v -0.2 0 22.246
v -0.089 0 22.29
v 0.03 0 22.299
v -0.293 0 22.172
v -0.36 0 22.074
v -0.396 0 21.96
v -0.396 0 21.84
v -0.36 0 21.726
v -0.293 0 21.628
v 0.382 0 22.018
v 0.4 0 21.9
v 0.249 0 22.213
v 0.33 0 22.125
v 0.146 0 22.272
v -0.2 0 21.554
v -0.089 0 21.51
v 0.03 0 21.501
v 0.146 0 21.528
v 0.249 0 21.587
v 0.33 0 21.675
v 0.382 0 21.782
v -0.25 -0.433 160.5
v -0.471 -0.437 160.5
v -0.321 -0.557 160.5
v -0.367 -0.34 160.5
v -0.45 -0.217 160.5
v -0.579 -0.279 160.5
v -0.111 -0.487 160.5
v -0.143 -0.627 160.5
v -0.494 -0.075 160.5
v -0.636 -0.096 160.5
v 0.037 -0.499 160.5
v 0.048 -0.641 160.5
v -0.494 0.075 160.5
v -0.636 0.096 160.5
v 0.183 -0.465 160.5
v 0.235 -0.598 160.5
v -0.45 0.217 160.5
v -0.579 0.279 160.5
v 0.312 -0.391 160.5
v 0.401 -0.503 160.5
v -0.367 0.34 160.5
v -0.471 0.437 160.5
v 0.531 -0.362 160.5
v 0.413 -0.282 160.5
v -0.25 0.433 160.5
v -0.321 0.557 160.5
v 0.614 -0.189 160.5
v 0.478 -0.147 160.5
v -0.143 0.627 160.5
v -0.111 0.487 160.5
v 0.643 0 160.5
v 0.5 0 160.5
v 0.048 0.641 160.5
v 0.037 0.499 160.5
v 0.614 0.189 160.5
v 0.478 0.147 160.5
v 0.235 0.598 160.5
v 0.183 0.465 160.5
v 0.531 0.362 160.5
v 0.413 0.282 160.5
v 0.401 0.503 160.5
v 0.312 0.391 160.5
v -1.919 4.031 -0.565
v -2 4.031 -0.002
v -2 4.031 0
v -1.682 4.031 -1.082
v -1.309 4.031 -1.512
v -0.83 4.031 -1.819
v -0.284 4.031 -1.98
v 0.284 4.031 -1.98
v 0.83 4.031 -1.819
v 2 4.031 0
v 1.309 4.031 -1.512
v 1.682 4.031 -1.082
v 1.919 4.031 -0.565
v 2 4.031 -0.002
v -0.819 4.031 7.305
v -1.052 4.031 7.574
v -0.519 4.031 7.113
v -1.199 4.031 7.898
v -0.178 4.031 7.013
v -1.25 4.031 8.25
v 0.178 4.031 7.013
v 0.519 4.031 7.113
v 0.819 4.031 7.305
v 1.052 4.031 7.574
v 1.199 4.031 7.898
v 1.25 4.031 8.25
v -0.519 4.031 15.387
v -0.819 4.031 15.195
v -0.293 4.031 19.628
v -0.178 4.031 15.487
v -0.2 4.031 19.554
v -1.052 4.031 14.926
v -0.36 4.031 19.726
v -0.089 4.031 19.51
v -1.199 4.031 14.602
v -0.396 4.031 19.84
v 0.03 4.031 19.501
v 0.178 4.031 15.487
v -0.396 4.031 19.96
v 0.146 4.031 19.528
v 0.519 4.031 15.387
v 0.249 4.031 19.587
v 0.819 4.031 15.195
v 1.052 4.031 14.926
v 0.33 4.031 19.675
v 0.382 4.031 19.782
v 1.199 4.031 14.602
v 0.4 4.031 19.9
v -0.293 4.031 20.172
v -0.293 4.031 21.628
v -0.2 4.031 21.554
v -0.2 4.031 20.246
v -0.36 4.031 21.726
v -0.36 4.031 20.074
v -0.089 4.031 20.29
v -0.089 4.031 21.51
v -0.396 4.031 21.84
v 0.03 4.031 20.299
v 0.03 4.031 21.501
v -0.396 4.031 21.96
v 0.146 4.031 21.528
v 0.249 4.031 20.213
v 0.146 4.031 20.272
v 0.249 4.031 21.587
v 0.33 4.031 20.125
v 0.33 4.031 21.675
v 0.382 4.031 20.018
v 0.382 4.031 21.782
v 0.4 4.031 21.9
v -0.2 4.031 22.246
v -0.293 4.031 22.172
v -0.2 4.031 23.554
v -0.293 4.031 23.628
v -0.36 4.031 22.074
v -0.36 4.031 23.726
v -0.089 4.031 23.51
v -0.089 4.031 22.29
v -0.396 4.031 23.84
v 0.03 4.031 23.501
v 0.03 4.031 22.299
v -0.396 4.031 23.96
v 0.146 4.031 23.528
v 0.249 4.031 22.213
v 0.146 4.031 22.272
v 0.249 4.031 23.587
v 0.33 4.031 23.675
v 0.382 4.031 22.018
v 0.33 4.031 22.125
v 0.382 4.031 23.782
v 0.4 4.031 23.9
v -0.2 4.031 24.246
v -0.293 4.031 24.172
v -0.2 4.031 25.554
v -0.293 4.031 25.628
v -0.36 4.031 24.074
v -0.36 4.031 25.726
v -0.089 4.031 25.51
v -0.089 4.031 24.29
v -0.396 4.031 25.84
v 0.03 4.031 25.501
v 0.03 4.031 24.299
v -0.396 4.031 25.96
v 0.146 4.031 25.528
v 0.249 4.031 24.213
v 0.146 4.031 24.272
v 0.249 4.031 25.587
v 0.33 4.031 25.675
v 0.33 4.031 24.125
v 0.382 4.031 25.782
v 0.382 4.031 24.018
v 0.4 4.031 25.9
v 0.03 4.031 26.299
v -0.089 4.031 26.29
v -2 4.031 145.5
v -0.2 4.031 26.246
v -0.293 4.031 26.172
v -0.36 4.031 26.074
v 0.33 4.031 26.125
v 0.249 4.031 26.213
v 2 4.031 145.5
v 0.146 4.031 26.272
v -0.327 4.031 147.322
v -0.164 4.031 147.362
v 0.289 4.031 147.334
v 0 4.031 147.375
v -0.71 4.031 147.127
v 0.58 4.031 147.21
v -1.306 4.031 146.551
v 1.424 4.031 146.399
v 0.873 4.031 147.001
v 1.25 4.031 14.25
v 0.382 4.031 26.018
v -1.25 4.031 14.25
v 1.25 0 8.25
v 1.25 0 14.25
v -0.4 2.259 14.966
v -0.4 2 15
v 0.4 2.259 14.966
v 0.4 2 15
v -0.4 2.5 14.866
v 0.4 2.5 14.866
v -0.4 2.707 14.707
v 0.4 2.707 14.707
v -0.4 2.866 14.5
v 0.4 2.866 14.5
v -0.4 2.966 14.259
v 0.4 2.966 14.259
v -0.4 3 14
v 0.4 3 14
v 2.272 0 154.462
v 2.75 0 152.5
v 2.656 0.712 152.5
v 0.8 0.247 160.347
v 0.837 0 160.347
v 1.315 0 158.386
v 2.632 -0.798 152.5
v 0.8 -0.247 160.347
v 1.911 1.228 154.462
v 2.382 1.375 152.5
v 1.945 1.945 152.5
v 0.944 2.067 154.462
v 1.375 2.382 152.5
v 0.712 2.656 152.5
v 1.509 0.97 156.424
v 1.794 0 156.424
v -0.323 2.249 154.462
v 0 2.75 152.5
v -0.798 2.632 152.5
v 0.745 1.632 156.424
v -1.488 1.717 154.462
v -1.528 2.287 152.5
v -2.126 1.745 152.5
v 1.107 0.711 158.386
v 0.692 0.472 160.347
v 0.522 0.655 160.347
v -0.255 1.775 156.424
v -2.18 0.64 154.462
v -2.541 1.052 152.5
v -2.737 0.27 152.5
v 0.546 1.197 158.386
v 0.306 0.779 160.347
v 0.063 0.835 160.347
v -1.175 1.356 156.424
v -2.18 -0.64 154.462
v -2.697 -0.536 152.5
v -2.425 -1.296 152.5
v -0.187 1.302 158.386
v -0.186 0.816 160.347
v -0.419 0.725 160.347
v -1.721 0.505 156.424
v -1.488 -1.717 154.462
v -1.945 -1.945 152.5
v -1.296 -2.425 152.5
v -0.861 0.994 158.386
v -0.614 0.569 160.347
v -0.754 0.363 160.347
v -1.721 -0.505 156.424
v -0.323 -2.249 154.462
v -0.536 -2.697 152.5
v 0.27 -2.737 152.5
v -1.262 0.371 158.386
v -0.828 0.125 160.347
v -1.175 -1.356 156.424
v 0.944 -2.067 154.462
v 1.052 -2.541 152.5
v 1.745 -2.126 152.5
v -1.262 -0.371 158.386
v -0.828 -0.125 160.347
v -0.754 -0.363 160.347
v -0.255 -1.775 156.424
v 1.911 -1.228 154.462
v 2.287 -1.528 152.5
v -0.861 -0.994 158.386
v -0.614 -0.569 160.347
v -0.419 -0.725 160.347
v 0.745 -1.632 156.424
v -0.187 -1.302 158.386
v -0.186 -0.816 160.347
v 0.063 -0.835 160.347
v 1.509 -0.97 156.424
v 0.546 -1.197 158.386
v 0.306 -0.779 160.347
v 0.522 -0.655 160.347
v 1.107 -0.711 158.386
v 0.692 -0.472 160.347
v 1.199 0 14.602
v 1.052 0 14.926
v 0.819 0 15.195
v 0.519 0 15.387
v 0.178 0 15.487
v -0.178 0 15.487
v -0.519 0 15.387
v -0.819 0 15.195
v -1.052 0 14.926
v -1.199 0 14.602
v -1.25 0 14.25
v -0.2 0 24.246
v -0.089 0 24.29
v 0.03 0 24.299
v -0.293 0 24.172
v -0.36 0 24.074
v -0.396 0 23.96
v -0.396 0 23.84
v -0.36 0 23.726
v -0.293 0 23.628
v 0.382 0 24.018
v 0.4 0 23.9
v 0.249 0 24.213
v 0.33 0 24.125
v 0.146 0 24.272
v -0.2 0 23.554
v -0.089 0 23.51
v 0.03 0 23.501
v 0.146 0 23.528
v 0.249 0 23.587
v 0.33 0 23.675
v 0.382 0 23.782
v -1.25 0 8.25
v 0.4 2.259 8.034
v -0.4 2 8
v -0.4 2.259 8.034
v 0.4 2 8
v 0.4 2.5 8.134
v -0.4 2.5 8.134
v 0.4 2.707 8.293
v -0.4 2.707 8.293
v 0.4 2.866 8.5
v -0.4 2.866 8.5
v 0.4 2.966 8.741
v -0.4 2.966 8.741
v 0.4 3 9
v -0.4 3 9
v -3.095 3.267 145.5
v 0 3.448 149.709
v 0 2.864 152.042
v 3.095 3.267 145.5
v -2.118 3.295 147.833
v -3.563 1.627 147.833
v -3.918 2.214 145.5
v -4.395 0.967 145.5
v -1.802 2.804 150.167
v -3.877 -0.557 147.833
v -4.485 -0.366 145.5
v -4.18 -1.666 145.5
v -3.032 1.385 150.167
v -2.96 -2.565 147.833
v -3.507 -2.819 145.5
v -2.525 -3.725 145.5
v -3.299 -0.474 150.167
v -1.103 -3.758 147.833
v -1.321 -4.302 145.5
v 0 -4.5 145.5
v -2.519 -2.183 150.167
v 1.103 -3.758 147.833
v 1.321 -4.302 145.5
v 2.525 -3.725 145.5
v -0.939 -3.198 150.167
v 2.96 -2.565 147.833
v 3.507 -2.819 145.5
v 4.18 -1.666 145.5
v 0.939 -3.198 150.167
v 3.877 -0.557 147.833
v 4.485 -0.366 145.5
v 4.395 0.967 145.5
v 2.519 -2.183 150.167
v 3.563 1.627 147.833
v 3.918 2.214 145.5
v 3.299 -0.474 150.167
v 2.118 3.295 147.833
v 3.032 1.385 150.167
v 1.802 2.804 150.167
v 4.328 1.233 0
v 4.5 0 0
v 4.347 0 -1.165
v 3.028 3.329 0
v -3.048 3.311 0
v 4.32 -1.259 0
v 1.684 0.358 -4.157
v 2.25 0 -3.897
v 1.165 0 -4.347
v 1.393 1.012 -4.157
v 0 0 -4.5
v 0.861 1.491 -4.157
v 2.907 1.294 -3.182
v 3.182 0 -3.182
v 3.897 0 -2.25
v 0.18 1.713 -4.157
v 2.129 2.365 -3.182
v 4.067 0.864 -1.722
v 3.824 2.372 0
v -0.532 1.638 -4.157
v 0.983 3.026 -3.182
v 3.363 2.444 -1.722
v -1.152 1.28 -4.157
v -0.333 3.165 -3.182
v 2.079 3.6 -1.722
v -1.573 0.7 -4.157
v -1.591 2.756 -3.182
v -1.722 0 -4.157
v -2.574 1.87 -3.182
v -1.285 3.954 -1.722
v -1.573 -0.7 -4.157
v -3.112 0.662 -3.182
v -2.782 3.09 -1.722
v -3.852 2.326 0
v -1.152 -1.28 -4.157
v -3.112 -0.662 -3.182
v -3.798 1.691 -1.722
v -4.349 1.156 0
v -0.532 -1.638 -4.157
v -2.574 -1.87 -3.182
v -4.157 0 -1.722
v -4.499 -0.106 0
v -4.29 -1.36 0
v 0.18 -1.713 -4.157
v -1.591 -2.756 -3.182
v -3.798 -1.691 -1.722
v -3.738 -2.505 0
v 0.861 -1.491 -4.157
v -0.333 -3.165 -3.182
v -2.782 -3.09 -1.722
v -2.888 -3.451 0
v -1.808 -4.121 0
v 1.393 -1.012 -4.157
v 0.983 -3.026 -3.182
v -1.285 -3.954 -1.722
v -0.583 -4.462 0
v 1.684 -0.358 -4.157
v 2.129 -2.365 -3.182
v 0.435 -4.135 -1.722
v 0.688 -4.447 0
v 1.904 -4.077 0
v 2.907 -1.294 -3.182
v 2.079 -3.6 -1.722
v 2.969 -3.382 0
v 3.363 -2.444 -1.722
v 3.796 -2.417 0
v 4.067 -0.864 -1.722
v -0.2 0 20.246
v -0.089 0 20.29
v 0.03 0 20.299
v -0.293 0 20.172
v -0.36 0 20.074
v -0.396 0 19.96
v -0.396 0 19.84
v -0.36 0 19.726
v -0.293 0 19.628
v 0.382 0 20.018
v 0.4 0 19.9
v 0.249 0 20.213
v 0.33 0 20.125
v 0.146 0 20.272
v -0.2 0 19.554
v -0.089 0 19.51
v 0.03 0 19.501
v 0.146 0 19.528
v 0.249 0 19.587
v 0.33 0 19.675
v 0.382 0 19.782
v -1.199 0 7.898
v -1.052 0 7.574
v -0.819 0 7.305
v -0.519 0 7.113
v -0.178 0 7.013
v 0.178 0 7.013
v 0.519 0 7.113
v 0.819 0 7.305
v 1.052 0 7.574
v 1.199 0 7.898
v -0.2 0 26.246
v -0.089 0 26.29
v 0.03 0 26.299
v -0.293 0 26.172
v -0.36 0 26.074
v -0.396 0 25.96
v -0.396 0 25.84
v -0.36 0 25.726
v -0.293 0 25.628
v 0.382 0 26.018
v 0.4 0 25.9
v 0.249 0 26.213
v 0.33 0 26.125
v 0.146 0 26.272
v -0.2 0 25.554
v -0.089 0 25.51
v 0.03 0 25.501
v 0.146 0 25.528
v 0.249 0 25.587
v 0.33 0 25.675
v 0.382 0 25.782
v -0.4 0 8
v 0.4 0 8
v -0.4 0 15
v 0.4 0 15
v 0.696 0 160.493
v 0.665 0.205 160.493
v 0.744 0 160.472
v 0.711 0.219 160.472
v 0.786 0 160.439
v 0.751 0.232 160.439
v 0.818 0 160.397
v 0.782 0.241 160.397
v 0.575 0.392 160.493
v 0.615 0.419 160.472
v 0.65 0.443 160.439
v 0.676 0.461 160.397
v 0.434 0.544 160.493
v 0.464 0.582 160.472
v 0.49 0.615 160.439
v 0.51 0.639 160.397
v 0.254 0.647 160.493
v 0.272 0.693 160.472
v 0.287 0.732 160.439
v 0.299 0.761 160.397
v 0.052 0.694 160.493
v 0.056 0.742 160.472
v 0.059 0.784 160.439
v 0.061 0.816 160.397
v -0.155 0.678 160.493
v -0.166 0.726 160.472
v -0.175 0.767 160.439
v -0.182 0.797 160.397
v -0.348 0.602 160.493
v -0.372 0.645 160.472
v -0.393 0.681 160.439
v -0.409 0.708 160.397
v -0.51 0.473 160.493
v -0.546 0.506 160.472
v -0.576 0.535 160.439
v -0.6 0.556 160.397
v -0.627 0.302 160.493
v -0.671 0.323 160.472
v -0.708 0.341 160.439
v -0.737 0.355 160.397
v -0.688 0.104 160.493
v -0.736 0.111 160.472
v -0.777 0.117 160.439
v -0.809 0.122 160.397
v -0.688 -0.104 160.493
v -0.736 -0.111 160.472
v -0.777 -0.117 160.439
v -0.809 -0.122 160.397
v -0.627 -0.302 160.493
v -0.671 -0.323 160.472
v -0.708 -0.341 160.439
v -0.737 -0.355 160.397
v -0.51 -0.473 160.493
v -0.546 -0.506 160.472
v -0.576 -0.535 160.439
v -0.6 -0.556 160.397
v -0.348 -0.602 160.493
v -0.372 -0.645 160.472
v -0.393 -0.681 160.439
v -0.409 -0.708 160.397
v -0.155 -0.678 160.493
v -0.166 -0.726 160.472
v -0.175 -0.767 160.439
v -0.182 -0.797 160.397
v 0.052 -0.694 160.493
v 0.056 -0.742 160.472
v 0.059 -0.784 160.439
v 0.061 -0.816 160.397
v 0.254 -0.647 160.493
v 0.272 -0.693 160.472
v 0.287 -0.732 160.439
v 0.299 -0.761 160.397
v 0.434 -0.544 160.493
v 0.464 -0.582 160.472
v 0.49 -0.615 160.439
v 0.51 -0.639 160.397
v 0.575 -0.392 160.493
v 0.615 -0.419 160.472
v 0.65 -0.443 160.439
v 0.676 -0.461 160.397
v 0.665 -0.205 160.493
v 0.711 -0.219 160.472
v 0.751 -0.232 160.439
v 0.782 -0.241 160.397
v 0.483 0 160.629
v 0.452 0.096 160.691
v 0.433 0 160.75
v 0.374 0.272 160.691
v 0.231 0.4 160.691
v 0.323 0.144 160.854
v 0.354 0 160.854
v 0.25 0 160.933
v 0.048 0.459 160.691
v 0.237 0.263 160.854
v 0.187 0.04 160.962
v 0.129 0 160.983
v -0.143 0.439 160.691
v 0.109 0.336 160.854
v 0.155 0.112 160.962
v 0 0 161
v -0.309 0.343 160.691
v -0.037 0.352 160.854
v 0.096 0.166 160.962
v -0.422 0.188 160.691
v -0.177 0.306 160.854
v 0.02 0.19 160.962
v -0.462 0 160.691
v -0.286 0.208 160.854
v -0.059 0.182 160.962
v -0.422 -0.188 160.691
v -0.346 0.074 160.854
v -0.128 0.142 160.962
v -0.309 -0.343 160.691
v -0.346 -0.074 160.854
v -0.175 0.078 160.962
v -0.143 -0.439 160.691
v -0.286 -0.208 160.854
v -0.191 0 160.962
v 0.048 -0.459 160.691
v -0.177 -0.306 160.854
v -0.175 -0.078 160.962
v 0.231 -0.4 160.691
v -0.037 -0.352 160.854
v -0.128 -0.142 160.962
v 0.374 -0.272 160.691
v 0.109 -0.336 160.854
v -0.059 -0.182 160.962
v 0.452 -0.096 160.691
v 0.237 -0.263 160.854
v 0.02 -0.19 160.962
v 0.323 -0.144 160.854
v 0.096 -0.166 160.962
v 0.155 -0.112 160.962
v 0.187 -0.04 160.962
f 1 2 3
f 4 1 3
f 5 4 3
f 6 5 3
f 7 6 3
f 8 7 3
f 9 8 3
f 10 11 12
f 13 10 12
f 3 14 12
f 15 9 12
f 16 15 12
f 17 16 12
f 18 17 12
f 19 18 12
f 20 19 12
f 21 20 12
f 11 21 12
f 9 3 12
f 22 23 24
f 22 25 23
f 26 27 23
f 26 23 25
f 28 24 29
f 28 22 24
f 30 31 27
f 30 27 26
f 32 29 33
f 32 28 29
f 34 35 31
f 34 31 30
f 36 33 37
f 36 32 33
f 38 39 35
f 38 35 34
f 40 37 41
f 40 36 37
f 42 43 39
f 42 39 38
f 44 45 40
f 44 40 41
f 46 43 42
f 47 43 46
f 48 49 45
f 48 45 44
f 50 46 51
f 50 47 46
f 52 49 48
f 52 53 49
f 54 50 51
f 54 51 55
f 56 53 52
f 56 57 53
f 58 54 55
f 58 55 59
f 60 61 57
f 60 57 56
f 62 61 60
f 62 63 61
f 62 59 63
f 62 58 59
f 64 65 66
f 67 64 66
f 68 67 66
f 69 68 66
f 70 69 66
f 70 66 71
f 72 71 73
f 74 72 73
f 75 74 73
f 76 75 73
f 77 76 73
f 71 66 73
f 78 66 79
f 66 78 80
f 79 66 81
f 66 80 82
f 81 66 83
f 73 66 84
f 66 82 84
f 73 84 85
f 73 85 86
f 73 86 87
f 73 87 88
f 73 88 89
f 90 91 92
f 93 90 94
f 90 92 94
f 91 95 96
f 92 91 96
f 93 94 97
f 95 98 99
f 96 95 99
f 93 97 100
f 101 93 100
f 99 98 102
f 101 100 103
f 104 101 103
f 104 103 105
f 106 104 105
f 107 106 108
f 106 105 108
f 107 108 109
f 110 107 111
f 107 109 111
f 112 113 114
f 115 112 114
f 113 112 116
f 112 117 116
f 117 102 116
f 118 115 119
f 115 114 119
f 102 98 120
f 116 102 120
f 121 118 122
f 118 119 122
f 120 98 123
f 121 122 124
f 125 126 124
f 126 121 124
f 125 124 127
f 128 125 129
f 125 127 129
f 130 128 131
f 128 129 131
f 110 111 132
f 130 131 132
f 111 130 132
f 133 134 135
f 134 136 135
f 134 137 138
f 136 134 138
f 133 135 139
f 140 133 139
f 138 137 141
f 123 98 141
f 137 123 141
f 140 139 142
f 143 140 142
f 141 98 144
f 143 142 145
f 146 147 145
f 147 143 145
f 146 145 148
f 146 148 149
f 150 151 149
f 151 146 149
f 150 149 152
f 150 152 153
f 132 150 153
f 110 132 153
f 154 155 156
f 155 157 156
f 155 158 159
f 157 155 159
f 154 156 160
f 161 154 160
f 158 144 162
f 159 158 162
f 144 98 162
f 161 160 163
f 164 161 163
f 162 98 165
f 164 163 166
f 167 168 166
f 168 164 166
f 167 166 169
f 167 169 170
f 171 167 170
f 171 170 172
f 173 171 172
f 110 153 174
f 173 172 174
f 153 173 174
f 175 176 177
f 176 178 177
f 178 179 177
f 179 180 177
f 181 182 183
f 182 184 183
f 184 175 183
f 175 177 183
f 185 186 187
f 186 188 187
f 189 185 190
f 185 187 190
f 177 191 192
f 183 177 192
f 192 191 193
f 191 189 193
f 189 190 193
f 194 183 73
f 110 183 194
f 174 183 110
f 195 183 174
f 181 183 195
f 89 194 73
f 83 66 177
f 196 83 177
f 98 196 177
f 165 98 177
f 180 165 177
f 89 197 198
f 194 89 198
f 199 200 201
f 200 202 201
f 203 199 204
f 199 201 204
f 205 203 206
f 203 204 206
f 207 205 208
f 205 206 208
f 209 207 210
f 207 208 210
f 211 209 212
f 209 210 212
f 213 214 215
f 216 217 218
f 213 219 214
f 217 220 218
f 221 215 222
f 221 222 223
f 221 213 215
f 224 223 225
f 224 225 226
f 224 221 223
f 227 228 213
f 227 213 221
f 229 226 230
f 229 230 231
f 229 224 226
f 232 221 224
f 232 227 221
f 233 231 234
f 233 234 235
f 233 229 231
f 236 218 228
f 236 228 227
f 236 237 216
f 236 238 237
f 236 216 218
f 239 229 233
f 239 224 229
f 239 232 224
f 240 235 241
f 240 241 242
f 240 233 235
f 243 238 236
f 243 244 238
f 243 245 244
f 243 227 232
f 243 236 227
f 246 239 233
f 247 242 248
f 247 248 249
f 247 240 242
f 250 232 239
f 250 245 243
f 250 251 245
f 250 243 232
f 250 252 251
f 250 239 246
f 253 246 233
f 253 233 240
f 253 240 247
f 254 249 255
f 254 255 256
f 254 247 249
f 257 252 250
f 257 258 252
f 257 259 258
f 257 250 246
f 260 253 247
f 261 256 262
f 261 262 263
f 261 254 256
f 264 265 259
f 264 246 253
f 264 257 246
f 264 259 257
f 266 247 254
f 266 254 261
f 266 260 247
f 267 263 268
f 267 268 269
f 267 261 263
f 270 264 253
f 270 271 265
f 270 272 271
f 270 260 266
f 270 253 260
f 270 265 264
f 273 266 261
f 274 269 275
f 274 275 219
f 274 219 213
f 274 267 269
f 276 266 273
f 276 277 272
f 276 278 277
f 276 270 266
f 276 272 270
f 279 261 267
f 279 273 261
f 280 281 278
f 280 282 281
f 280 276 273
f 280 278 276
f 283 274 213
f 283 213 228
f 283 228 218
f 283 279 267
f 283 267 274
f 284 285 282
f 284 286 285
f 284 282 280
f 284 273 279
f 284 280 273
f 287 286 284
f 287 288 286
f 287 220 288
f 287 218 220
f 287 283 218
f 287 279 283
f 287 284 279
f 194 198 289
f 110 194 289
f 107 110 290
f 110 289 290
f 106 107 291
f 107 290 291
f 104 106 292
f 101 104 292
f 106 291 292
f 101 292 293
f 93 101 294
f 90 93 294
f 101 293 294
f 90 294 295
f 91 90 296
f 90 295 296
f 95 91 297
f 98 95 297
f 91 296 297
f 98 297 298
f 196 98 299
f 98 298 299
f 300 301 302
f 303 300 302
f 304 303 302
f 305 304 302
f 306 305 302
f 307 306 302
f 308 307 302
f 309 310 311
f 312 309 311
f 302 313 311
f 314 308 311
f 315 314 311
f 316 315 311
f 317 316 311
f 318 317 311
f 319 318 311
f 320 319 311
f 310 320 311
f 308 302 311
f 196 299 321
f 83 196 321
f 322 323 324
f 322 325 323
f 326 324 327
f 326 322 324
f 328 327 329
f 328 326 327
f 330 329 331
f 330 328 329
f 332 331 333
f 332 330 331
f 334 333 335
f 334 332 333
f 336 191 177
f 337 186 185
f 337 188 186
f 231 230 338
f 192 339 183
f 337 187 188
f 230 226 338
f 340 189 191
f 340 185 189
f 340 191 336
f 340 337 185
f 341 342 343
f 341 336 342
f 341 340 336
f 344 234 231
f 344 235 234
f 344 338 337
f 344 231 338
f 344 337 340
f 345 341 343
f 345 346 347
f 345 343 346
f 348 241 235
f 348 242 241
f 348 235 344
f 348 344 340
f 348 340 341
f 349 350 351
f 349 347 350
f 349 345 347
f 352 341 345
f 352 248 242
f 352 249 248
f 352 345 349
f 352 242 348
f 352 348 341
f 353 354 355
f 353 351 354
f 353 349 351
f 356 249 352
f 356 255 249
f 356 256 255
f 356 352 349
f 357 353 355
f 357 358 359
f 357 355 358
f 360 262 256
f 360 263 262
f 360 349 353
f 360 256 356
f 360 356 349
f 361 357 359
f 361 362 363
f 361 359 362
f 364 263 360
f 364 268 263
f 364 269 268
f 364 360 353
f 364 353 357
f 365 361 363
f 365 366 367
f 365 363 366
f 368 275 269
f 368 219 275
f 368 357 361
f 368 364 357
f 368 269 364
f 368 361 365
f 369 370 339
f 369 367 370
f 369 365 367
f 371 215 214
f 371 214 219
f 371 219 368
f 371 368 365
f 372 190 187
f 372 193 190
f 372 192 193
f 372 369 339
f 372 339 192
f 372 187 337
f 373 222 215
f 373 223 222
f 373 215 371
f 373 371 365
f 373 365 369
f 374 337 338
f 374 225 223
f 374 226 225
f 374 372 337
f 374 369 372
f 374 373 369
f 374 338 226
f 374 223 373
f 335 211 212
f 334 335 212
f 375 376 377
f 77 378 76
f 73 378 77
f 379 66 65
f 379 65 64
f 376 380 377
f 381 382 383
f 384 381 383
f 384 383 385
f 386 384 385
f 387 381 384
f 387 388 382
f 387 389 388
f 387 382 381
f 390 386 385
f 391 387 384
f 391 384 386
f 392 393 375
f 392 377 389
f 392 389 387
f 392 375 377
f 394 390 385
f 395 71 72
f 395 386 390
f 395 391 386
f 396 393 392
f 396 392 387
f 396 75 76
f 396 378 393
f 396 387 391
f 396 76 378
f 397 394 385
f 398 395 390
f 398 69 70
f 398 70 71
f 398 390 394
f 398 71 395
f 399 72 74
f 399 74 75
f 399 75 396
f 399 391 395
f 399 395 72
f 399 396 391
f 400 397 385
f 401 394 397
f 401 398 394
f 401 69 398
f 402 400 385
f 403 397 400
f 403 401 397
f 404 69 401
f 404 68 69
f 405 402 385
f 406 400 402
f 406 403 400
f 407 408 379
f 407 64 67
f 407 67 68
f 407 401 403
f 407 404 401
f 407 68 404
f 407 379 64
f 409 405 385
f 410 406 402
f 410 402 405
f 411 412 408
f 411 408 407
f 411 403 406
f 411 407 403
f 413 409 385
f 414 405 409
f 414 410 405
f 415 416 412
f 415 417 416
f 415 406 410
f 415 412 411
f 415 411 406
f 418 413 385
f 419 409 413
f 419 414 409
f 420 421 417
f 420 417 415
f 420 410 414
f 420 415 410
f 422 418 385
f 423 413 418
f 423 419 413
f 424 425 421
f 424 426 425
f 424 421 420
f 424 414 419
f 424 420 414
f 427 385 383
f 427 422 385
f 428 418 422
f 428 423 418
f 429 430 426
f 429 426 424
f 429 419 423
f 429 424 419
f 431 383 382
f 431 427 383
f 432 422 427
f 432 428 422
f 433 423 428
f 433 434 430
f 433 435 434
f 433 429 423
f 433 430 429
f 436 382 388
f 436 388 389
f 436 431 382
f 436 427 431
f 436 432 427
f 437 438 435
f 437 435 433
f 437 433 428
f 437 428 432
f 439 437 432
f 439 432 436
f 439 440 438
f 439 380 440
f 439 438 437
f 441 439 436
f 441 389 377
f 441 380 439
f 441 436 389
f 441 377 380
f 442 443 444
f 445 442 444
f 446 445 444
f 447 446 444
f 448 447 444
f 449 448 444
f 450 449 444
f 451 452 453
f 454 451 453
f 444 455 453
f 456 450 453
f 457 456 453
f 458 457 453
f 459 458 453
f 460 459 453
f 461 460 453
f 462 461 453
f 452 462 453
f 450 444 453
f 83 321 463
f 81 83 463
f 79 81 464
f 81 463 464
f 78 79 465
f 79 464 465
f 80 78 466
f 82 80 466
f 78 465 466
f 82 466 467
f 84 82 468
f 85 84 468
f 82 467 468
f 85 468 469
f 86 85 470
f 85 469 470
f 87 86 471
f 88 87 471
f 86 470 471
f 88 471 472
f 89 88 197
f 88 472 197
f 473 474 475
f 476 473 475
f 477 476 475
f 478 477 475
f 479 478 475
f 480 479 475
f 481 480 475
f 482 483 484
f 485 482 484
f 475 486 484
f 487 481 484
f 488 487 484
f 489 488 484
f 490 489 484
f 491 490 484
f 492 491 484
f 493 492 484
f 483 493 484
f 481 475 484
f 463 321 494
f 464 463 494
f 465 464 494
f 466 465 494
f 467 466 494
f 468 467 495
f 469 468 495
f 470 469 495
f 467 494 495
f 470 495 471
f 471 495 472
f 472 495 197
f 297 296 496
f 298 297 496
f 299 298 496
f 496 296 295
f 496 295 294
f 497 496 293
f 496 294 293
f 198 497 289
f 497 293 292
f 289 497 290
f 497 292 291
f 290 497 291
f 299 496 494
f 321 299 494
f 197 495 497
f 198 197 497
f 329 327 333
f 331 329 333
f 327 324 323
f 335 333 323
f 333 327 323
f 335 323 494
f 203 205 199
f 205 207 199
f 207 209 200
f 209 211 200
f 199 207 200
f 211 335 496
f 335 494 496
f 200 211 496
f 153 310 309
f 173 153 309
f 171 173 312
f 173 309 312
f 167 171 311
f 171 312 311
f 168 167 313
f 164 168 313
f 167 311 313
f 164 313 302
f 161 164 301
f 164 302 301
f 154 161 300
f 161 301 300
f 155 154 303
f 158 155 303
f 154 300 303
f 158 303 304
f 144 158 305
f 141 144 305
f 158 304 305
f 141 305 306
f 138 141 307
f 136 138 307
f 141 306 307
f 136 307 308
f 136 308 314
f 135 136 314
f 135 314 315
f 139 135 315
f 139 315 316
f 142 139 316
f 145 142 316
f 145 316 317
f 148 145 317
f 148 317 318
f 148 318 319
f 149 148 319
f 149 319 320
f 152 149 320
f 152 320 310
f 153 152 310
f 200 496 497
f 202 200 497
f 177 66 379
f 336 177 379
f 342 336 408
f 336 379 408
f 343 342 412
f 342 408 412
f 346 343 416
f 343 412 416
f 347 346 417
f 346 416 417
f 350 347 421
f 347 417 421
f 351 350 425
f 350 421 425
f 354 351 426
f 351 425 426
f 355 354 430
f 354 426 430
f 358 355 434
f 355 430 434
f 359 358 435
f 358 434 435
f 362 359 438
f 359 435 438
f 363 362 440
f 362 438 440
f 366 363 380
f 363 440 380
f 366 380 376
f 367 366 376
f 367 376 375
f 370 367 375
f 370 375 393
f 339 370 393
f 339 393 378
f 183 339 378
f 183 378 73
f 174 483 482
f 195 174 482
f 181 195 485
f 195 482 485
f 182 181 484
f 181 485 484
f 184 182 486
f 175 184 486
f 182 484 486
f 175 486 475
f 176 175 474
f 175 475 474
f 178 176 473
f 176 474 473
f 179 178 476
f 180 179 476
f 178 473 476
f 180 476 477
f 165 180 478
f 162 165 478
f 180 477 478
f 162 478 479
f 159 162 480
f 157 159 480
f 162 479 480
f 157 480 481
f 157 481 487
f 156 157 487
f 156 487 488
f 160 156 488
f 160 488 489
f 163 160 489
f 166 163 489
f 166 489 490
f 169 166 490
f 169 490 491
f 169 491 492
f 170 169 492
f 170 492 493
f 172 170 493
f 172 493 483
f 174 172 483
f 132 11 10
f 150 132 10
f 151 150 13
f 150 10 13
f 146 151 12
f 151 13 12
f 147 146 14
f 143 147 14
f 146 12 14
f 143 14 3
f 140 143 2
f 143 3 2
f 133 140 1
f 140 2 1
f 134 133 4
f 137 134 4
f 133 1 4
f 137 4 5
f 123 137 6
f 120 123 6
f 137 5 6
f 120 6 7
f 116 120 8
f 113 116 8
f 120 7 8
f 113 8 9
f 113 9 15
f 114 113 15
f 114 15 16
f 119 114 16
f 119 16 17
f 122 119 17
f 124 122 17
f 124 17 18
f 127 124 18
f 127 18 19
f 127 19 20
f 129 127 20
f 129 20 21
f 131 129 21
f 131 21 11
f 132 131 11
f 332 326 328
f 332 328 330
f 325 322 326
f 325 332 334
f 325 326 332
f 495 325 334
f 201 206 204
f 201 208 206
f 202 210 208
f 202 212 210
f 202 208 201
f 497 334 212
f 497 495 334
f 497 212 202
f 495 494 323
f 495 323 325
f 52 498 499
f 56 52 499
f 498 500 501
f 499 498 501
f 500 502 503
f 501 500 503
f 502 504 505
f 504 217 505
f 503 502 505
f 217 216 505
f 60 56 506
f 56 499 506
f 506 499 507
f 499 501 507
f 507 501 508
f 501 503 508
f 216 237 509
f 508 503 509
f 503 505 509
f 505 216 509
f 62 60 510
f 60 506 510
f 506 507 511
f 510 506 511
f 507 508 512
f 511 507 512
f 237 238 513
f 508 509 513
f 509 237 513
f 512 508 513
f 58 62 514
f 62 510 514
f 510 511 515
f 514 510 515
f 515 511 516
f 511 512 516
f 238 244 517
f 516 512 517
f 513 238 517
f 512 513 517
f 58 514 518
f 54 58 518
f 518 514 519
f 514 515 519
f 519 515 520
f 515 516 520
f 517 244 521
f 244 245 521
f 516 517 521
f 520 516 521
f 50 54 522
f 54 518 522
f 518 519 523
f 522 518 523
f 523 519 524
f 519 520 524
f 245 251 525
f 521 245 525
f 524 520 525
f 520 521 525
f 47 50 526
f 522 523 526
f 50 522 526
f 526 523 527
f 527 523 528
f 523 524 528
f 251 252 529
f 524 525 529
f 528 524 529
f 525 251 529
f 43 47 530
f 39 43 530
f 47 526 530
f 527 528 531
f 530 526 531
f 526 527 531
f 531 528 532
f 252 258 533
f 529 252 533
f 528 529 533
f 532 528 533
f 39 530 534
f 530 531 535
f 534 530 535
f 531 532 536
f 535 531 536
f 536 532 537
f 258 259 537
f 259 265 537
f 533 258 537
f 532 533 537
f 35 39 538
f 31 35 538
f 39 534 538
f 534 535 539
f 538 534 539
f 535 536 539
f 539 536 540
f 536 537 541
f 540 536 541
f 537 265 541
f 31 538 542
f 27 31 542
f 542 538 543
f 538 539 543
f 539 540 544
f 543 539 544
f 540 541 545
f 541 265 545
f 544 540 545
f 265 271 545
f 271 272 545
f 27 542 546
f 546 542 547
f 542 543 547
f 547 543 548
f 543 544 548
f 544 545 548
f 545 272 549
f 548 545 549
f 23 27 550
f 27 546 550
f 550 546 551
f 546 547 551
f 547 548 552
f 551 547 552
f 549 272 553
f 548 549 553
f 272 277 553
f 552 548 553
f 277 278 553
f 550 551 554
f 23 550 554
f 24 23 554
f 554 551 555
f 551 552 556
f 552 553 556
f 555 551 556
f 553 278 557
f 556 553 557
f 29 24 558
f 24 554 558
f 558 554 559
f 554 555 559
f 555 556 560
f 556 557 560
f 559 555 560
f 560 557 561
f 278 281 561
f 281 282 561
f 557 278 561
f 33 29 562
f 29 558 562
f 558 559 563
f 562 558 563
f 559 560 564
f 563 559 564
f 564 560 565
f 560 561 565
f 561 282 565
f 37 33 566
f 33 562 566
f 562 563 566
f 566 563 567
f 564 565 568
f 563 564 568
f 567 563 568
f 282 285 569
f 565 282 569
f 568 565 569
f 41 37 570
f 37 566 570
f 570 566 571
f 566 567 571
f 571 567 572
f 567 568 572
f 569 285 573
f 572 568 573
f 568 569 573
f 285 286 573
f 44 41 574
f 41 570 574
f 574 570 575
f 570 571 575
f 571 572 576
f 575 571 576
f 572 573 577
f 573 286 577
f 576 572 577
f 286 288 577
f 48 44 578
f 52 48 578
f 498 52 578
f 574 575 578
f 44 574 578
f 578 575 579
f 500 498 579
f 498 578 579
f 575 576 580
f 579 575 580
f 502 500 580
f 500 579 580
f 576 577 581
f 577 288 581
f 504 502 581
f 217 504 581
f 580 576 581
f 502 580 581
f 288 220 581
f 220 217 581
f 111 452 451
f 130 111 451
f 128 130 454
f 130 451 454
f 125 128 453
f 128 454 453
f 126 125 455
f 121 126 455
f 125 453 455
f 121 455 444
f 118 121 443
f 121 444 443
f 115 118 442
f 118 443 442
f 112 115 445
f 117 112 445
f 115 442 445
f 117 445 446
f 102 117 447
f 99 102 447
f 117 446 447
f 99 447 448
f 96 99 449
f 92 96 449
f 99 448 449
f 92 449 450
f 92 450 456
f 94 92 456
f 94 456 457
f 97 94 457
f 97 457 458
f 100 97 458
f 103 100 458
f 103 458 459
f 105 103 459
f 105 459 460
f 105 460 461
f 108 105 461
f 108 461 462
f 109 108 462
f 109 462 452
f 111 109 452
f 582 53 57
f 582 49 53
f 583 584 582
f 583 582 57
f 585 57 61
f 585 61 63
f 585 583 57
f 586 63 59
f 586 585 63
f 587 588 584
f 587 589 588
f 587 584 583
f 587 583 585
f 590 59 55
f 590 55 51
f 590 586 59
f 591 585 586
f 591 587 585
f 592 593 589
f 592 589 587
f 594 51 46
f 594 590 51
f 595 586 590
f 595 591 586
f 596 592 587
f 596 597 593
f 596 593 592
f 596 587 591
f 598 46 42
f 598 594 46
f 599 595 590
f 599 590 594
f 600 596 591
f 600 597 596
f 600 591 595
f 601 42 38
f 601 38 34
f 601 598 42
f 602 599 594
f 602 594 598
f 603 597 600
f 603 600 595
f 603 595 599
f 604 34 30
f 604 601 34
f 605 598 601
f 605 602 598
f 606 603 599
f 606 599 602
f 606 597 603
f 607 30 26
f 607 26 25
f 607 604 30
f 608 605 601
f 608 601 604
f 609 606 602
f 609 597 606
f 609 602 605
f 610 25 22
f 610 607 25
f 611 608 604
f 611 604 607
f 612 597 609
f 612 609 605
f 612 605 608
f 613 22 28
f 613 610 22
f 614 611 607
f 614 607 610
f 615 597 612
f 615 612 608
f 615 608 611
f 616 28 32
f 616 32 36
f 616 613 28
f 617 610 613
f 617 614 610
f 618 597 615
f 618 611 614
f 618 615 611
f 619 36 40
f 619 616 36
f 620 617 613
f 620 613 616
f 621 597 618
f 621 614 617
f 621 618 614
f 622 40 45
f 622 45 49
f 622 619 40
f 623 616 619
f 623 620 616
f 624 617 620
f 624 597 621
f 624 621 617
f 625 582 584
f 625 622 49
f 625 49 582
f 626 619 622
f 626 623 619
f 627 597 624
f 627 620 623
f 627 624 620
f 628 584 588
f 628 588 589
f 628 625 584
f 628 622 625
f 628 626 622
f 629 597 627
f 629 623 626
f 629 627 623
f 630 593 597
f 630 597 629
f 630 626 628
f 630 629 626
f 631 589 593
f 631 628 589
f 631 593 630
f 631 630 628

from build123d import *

# Parameters (mm, degrees)
SKETCH_R        = 4.5
PAD_DEPTH       = 145.5
SKETCH001_W     = 4
SKETCH001_H     = 3.989153
POCKET_DEPTH    = 150
SKETCH002_R     = 0.4
POCKET001_DEPTH = 10
FILLET_R        = 0.2
SKETCH003_W     = 0.8
SKETCH003_H     = 7
PAD001_DEPTH    = 3
FILLET001_R     = 1


with BuildPart() as part:
    # Sketch → Pad (new body)
    with BuildSketch(Plane.XY):
        Circle(SKETCH_R)
    extrude(amount=PAD_DEPTH)

    # Cone → Cone (revolve)
    with BuildSketch(Plane(origin=(0, 0, 145.5), x_dir=(0, 1, 0), z_dir=(1, 0, 0))):
        Polygon((0, 0), (4.5, 0), (2.75, 7), (0, 7), align=None)
    revolve(axis=Axis((0, 0, 145.5), (0, 0, 1)))

    # Sphere001 → Sphere001 (revolve)
    with BuildSketch(Plane.XZ):
        with BuildLine():
            ThreePointArc((0, -4.5), (4.5, 0), (0, 4.5))
            Line((0, 4.5), (0, -4.5))
        make_face()
    revolve(axis=Axis((0, 0, 0), (0, 0, 1)))

    # Sketch001 → Pocket (cut, symmetric)
    with BuildSketch(Plane.XY):
        with Locations((0, 6.025705)):
            Rectangle(SKETCH001_W, SKETCH001_H)
    extrude(amount=POCKET_DEPTH, both=True, mode=Mode.SUBTRACT)

    # Sketch002 → Pocket001 (cut)
    with BuildSketch(Plane.XZ):
        with Locations((0, 19.9)):
            Circle(SKETCH002_R)
        with Locations((0, 21.9)):
            Circle(SKETCH002_R)
        with Locations((0, 23.9)):
            Circle(SKETCH002_R)
        with Locations((0, 25.9)):
            Circle(SKETCH002_R)
        with BuildLine():
            Line((-1.25, 14.25), (-1.25, 8.25))
            ThreePointArc((-1.25, 8.25), (0, 7), (1.25, 8.25))
            Line((1.25, 8.25), (1.25, 14.25))
            ThreePointArc((1.25, 14.25), (0, 15.5), (-1.25, 14.25))
        make_face()
    extrude(amount=-POCKET001_DEPTH, mode=Mode.SUBTRACT)

    # Cone001 → Cone001 (revolve)
    with BuildSketch(Plane(origin=(0, 0, 152.5), x_dir=(1, 0, 0), z_dir=(0, -1, 0))):
        Polygon((0, 0), (2.75, 0), (0.8, 8), (0, 8), align=None)
    revolve(axis=Axis((0, 0, 152.5), (0, 0, 1)))

    # Sphere → Sphere (revolve)
    with BuildSketch(Plane(origin=(0, 0, 160.5), x_dir=(1, 0, 0), z_dir=(0, -1, 0))):
        with BuildLine():
            ThreePointArc((0, -0.5), (0.5, 0), (0, 0.5))
            Line((0, 0.5), (0, -0.5))
        make_face()
    revolve(axis=Axis((0, 0, 160.5), (0, 0, 1)))

    # Fillet
    fillet_edges = [part.edges().sort_by_distance(p)[0] for p in [
        (-0.8, 0, 160.5),
    ]]
    fillet(fillet_edges, radius=FILLET_R)

    # Sketch003 → Pad001 (join)
    with BuildSketch(Plane.XZ):
        with Locations((0, 11.5)):
            Rectangle(SKETCH003_W, SKETCH003_H)
    extrude(amount=-PAD001_DEPTH)

    # Fillet001
    fillet001_edges = [part.edges().sort_by_distance(p)[0] for p in [
        (0, 3, 8),
        (0, 3, 15),
    ]]
    fillet(fillet001_edges, radius=FILLET001_R)


solid = part.part
